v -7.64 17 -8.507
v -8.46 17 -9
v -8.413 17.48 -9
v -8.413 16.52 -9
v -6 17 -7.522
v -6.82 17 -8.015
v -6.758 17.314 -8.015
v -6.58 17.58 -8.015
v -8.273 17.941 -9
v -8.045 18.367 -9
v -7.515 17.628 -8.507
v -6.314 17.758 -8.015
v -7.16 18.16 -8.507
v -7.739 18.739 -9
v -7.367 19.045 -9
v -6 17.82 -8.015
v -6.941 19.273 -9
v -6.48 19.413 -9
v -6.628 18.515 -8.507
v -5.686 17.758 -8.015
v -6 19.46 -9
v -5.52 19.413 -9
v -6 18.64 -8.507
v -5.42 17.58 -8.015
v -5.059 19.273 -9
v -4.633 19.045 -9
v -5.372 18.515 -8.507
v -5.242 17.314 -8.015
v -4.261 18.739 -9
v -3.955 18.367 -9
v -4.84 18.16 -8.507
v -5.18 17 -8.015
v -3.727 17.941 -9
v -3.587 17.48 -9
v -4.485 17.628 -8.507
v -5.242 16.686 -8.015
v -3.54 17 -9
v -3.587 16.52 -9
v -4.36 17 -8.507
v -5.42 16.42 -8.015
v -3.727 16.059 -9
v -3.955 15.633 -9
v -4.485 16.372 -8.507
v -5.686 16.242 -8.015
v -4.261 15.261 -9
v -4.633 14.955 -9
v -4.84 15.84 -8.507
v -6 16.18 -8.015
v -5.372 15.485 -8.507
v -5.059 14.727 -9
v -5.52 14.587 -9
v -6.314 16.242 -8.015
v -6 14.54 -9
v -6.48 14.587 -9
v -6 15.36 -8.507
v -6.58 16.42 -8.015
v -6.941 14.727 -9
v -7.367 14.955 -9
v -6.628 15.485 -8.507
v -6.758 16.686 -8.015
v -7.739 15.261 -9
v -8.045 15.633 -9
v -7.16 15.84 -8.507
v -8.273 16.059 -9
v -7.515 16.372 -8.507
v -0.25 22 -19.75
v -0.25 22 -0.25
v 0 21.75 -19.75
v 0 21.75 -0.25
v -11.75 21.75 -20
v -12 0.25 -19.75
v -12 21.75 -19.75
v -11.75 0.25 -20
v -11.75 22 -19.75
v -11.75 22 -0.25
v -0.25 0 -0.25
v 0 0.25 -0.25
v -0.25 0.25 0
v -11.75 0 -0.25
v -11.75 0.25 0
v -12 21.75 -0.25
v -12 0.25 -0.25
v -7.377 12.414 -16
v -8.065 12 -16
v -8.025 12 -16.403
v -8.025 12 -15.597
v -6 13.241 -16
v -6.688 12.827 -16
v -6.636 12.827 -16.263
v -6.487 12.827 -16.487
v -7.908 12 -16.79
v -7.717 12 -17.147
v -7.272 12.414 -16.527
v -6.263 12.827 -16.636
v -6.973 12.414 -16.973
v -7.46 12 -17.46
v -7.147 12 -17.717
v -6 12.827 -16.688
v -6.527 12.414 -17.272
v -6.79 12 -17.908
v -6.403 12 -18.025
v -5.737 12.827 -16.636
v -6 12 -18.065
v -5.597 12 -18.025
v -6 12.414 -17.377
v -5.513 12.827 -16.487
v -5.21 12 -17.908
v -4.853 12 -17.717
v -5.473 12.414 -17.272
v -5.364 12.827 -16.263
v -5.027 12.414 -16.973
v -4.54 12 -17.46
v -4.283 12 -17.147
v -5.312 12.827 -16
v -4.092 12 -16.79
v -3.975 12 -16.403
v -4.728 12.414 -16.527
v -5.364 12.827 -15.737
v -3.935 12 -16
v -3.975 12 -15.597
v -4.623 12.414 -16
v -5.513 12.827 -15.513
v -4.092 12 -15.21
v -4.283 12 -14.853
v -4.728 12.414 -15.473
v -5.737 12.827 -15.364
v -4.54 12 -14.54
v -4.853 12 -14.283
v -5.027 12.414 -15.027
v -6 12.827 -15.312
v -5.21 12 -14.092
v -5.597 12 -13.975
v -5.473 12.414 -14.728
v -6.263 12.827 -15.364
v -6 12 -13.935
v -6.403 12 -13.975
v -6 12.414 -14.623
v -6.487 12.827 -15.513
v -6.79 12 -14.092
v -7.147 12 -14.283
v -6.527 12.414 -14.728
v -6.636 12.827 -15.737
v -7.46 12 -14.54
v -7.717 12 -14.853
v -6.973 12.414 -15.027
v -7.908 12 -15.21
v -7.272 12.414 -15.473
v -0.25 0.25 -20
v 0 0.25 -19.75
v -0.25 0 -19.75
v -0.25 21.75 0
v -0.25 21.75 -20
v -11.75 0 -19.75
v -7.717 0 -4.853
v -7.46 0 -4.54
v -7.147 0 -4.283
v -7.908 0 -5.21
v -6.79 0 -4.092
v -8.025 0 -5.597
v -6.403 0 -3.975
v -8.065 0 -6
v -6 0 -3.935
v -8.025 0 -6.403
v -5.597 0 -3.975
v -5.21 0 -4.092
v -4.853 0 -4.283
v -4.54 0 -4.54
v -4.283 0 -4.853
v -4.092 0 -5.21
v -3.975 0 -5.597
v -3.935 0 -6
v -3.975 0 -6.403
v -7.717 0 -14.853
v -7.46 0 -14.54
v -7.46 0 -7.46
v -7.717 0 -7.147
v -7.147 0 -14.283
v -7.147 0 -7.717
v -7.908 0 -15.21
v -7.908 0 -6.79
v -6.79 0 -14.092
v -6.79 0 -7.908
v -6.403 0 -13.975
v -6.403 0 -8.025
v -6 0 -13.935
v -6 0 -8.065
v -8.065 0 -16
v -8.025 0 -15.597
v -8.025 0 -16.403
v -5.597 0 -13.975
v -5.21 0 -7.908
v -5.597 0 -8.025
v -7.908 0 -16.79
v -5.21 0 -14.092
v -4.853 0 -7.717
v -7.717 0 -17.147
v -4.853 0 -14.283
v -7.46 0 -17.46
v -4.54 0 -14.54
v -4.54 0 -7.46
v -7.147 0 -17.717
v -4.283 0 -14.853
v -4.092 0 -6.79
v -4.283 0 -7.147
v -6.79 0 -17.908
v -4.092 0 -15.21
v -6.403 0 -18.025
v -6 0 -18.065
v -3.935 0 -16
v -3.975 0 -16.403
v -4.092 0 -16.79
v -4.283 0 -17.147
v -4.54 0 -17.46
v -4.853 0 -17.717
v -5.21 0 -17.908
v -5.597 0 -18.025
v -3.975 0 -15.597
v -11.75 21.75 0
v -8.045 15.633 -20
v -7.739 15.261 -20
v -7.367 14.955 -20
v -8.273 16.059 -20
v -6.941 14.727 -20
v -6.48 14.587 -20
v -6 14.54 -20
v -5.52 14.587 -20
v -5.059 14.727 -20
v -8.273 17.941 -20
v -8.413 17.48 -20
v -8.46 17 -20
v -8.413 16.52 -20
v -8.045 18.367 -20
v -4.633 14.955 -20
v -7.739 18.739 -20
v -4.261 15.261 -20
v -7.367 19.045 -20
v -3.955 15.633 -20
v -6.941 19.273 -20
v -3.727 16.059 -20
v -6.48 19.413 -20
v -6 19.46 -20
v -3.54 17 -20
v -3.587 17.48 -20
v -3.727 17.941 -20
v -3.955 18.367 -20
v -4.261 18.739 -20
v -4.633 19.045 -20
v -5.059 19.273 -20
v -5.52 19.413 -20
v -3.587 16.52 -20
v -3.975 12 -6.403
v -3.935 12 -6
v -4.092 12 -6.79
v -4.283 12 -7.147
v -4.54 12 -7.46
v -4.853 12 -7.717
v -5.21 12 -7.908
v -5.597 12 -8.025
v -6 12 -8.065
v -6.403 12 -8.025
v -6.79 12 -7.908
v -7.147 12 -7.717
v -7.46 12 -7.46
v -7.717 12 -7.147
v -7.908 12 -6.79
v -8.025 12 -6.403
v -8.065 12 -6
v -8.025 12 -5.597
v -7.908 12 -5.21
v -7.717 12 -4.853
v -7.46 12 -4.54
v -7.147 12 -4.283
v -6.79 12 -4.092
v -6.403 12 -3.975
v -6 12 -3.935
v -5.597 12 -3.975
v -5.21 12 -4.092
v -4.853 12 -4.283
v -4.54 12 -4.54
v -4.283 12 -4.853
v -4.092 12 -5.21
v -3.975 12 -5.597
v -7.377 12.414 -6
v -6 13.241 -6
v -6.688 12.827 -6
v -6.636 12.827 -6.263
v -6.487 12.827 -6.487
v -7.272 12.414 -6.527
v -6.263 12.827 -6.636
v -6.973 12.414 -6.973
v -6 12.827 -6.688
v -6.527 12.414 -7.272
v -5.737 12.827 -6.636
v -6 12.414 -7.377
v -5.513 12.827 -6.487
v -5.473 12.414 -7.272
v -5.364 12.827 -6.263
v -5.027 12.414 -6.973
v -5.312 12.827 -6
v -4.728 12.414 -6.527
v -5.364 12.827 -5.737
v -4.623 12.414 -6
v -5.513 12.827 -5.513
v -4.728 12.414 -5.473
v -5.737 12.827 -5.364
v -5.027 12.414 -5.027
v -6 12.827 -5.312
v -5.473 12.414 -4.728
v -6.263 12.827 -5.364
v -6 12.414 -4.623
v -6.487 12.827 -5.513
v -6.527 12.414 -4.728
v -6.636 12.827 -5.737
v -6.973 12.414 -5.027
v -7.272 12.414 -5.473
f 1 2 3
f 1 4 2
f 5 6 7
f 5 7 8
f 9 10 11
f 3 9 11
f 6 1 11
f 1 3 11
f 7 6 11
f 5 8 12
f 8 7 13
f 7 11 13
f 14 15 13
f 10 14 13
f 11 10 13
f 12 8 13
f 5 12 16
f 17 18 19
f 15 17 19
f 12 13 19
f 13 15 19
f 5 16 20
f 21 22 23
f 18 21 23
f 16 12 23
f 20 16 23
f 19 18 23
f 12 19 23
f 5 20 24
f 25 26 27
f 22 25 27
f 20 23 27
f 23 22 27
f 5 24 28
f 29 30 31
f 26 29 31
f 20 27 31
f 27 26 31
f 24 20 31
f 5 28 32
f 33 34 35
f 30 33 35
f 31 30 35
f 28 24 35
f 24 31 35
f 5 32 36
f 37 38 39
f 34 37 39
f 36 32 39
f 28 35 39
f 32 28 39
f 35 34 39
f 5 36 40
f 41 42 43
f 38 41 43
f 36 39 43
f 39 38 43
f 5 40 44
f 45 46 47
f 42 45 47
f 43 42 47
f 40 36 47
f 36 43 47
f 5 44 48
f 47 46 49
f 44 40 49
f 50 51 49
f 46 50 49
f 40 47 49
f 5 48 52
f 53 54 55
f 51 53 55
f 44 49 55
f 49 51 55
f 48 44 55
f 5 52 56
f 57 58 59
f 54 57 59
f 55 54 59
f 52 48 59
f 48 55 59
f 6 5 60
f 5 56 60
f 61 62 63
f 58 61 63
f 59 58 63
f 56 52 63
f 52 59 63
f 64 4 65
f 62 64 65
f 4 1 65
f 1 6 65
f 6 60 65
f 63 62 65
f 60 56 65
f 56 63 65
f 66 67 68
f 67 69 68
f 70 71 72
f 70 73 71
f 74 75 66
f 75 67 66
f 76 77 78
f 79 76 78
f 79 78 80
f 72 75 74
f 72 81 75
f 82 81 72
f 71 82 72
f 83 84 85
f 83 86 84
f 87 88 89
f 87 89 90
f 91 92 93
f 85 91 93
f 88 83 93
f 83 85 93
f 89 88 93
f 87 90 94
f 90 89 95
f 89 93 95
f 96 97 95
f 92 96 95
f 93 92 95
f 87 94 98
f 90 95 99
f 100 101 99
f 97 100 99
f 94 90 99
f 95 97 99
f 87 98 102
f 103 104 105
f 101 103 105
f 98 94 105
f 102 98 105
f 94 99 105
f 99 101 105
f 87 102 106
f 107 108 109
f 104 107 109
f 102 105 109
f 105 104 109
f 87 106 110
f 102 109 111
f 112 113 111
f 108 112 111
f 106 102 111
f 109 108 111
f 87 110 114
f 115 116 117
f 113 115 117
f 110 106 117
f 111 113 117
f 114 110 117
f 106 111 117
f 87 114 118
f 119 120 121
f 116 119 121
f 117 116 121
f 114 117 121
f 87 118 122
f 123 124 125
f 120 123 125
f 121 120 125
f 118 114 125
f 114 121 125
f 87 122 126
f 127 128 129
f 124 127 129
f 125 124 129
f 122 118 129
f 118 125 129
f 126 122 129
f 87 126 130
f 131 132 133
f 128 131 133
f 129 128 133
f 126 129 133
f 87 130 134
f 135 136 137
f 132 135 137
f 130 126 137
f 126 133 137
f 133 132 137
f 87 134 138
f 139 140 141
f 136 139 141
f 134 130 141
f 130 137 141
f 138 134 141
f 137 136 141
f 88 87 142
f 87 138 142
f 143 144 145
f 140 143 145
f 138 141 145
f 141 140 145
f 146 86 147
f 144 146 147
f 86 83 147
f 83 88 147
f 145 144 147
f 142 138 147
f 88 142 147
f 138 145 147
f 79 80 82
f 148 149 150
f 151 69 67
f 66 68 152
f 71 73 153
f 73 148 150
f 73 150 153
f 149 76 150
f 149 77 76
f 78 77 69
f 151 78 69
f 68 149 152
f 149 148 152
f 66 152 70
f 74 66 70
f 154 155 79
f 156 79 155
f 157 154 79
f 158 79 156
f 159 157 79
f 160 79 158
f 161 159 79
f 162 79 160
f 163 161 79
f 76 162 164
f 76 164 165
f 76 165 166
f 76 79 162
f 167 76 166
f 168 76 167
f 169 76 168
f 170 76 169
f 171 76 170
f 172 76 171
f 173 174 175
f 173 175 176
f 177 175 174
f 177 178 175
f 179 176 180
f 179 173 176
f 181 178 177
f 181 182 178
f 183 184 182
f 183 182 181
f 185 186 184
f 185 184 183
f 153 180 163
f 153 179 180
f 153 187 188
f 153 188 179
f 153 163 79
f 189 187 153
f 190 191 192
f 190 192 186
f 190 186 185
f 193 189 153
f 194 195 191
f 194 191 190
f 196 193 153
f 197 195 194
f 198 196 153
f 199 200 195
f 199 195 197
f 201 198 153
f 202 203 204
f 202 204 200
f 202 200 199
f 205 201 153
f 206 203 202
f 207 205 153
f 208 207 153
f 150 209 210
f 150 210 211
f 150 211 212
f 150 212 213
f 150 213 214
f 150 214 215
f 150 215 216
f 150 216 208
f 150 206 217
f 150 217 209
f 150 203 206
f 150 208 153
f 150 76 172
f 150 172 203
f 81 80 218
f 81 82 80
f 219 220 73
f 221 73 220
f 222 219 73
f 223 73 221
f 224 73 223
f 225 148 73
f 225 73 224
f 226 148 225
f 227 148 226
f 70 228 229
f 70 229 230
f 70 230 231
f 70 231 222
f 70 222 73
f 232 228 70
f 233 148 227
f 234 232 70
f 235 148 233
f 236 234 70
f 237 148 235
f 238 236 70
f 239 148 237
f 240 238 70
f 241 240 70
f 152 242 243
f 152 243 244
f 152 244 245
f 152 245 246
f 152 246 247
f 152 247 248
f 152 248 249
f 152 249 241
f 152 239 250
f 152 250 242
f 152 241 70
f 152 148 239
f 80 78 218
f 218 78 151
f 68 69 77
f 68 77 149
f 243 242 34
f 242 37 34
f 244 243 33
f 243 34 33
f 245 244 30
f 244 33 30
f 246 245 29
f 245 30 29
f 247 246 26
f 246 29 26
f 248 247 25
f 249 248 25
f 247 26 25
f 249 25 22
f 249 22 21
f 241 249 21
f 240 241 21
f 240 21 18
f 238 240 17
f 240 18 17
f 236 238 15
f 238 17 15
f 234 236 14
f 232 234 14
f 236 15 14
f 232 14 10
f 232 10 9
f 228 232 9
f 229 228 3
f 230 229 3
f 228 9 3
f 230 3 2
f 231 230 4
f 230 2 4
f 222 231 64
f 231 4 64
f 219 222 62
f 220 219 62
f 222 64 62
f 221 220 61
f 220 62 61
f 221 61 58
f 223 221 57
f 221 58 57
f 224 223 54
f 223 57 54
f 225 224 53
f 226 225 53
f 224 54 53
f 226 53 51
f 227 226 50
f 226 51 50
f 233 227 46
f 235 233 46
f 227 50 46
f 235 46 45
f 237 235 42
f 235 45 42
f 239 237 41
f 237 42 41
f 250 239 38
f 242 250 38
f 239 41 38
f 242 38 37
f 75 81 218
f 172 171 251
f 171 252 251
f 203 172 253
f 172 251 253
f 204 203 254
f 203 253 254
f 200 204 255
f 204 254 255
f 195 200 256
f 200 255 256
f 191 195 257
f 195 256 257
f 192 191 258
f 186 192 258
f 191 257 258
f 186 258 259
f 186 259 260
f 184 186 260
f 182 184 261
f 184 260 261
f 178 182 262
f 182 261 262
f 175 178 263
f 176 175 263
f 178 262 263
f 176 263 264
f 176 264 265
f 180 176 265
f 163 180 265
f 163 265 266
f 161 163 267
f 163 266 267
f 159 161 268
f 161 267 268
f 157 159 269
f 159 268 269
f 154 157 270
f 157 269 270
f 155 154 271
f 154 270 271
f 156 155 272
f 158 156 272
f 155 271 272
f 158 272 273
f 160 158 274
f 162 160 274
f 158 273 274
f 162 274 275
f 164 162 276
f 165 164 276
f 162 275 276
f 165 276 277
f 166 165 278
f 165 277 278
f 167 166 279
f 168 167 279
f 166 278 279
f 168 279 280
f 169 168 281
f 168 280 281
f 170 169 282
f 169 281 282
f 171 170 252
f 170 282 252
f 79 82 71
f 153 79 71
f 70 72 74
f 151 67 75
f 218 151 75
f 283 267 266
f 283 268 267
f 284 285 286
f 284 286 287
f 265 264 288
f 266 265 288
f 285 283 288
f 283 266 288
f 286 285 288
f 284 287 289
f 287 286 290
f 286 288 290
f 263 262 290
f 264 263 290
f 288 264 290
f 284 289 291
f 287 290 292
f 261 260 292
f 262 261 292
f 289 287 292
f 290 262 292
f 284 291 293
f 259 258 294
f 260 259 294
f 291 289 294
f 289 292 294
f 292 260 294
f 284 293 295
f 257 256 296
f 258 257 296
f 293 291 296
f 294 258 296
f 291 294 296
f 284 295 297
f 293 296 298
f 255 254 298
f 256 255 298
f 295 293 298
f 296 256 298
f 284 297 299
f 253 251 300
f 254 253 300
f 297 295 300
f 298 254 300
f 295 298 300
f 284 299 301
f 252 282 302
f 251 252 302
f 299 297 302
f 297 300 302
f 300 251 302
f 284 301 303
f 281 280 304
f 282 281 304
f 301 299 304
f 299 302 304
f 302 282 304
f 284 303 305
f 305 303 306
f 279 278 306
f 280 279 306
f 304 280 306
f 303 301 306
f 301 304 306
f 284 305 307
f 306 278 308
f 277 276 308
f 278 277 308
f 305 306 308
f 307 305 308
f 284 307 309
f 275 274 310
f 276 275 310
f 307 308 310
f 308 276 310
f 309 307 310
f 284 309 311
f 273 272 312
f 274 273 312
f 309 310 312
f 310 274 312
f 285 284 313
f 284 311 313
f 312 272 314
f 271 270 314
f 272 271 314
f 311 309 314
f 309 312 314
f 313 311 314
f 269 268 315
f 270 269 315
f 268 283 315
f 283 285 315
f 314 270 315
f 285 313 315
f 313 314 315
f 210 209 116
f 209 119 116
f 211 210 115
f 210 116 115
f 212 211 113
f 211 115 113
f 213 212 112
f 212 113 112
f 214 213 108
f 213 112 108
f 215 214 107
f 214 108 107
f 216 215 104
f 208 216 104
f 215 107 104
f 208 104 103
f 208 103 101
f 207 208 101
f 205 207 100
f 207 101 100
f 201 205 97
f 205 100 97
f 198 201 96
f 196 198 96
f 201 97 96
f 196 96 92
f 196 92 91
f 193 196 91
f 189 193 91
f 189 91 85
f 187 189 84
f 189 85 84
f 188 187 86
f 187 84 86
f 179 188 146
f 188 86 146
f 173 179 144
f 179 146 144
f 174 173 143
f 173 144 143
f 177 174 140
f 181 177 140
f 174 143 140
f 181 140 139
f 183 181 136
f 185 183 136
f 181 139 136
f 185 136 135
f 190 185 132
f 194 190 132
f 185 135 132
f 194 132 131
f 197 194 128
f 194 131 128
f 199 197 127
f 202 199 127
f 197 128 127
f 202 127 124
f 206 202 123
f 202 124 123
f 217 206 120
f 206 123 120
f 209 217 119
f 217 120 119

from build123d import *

# Parameters (mm, degrees)
SKETCH1_W                  = 20
SKETCH1_H                  = 22
BOSS_EXTRUDE1_DEPTH        = 12
HOLE1_D                    = 4.92
HOLE1_DEPTH                = 11
HOLE1_TIP                  = 1.478117123
M3_5_CLEARANCE_HOLE1_D     = 4.13
M3_5_CLEARANCE_HOLE1_DEPTH = 12
M3_5_CLEARANCE_HOLE1_TIP   = 1.240777178
CHAMFER1_SIZE              = 0.25


with BuildPart() as part:
    # Sketch1 → Boss-Extrude1 (new body)
    with BuildSketch(Plane(origin=(0, 0, 0), x_dir=(0, 0, -1), z_dir=(1, 0, 0))):
        with Locations((10, 11)):
            Rectangle(SKETCH1_W, SKETCH1_H)
    extrude(amount=-BOSS_EXTRUDE1_DEPTH)

    # Hole1
    with Locations(Plane(origin=(0, 0, -20), x_dir=(-1, 0, 0), z_dir=(0, 0, -1))):
        with Locations((6, 17)):
            Hole(HOLE1_D / 2, depth=HOLE1_DEPTH)
            with Locations((0, 0, -(HOLE1_DEPTH + HOLE1_TIP / 2))):  # 118° drill point
                Cone(0, HOLE1_D / 2, HOLE1_TIP, mode=Mode.SUBTRACT)

    # M3.5 Clearance Hole1
    with Locations(Plane(origin=(0, 0, 0), x_dir=(-1, 0, 0), z_dir=(0, -1, 0))):
        with Locations((6, 16), (6, 6)):
            Hole(M3_5_CLEARANCE_HOLE1_D / 2, depth=M3_5_CLEARANCE_HOLE1_DEPTH)
            with Locations((0, 0, -(M3_5_CLEARANCE_HOLE1_DEPTH + M3_5_CLEARANCE_HOLE1_TIP / 2))):  # 118° drill point
                Cone(0, M3_5_CLEARANCE_HOLE1_D / 2, M3_5_CLEARANCE_HOLE1_TIP, mode=Mode.SUBTRACT)

    # Chamfer1
    chamfer1_edges = [part.edges().sort_by_distance(p)[0] for p in [
        (-12, 11, -20),
        (-12, 22, -10),
        (-12, 11, 0),
        (0, 22, -10),
        (0, 11, -20),
        (0, 0, -10),
        (0, 11, 0),
        (-6, 22, 0),
        (-6, 22, -20),
        (-6, 0, -20),
        (-6, 0, 0),
        (-12, 0, -10),
    ]]
    chamfer(chamfer1_edges, length=CHAMFER1_SIZE)


solid = part.part
